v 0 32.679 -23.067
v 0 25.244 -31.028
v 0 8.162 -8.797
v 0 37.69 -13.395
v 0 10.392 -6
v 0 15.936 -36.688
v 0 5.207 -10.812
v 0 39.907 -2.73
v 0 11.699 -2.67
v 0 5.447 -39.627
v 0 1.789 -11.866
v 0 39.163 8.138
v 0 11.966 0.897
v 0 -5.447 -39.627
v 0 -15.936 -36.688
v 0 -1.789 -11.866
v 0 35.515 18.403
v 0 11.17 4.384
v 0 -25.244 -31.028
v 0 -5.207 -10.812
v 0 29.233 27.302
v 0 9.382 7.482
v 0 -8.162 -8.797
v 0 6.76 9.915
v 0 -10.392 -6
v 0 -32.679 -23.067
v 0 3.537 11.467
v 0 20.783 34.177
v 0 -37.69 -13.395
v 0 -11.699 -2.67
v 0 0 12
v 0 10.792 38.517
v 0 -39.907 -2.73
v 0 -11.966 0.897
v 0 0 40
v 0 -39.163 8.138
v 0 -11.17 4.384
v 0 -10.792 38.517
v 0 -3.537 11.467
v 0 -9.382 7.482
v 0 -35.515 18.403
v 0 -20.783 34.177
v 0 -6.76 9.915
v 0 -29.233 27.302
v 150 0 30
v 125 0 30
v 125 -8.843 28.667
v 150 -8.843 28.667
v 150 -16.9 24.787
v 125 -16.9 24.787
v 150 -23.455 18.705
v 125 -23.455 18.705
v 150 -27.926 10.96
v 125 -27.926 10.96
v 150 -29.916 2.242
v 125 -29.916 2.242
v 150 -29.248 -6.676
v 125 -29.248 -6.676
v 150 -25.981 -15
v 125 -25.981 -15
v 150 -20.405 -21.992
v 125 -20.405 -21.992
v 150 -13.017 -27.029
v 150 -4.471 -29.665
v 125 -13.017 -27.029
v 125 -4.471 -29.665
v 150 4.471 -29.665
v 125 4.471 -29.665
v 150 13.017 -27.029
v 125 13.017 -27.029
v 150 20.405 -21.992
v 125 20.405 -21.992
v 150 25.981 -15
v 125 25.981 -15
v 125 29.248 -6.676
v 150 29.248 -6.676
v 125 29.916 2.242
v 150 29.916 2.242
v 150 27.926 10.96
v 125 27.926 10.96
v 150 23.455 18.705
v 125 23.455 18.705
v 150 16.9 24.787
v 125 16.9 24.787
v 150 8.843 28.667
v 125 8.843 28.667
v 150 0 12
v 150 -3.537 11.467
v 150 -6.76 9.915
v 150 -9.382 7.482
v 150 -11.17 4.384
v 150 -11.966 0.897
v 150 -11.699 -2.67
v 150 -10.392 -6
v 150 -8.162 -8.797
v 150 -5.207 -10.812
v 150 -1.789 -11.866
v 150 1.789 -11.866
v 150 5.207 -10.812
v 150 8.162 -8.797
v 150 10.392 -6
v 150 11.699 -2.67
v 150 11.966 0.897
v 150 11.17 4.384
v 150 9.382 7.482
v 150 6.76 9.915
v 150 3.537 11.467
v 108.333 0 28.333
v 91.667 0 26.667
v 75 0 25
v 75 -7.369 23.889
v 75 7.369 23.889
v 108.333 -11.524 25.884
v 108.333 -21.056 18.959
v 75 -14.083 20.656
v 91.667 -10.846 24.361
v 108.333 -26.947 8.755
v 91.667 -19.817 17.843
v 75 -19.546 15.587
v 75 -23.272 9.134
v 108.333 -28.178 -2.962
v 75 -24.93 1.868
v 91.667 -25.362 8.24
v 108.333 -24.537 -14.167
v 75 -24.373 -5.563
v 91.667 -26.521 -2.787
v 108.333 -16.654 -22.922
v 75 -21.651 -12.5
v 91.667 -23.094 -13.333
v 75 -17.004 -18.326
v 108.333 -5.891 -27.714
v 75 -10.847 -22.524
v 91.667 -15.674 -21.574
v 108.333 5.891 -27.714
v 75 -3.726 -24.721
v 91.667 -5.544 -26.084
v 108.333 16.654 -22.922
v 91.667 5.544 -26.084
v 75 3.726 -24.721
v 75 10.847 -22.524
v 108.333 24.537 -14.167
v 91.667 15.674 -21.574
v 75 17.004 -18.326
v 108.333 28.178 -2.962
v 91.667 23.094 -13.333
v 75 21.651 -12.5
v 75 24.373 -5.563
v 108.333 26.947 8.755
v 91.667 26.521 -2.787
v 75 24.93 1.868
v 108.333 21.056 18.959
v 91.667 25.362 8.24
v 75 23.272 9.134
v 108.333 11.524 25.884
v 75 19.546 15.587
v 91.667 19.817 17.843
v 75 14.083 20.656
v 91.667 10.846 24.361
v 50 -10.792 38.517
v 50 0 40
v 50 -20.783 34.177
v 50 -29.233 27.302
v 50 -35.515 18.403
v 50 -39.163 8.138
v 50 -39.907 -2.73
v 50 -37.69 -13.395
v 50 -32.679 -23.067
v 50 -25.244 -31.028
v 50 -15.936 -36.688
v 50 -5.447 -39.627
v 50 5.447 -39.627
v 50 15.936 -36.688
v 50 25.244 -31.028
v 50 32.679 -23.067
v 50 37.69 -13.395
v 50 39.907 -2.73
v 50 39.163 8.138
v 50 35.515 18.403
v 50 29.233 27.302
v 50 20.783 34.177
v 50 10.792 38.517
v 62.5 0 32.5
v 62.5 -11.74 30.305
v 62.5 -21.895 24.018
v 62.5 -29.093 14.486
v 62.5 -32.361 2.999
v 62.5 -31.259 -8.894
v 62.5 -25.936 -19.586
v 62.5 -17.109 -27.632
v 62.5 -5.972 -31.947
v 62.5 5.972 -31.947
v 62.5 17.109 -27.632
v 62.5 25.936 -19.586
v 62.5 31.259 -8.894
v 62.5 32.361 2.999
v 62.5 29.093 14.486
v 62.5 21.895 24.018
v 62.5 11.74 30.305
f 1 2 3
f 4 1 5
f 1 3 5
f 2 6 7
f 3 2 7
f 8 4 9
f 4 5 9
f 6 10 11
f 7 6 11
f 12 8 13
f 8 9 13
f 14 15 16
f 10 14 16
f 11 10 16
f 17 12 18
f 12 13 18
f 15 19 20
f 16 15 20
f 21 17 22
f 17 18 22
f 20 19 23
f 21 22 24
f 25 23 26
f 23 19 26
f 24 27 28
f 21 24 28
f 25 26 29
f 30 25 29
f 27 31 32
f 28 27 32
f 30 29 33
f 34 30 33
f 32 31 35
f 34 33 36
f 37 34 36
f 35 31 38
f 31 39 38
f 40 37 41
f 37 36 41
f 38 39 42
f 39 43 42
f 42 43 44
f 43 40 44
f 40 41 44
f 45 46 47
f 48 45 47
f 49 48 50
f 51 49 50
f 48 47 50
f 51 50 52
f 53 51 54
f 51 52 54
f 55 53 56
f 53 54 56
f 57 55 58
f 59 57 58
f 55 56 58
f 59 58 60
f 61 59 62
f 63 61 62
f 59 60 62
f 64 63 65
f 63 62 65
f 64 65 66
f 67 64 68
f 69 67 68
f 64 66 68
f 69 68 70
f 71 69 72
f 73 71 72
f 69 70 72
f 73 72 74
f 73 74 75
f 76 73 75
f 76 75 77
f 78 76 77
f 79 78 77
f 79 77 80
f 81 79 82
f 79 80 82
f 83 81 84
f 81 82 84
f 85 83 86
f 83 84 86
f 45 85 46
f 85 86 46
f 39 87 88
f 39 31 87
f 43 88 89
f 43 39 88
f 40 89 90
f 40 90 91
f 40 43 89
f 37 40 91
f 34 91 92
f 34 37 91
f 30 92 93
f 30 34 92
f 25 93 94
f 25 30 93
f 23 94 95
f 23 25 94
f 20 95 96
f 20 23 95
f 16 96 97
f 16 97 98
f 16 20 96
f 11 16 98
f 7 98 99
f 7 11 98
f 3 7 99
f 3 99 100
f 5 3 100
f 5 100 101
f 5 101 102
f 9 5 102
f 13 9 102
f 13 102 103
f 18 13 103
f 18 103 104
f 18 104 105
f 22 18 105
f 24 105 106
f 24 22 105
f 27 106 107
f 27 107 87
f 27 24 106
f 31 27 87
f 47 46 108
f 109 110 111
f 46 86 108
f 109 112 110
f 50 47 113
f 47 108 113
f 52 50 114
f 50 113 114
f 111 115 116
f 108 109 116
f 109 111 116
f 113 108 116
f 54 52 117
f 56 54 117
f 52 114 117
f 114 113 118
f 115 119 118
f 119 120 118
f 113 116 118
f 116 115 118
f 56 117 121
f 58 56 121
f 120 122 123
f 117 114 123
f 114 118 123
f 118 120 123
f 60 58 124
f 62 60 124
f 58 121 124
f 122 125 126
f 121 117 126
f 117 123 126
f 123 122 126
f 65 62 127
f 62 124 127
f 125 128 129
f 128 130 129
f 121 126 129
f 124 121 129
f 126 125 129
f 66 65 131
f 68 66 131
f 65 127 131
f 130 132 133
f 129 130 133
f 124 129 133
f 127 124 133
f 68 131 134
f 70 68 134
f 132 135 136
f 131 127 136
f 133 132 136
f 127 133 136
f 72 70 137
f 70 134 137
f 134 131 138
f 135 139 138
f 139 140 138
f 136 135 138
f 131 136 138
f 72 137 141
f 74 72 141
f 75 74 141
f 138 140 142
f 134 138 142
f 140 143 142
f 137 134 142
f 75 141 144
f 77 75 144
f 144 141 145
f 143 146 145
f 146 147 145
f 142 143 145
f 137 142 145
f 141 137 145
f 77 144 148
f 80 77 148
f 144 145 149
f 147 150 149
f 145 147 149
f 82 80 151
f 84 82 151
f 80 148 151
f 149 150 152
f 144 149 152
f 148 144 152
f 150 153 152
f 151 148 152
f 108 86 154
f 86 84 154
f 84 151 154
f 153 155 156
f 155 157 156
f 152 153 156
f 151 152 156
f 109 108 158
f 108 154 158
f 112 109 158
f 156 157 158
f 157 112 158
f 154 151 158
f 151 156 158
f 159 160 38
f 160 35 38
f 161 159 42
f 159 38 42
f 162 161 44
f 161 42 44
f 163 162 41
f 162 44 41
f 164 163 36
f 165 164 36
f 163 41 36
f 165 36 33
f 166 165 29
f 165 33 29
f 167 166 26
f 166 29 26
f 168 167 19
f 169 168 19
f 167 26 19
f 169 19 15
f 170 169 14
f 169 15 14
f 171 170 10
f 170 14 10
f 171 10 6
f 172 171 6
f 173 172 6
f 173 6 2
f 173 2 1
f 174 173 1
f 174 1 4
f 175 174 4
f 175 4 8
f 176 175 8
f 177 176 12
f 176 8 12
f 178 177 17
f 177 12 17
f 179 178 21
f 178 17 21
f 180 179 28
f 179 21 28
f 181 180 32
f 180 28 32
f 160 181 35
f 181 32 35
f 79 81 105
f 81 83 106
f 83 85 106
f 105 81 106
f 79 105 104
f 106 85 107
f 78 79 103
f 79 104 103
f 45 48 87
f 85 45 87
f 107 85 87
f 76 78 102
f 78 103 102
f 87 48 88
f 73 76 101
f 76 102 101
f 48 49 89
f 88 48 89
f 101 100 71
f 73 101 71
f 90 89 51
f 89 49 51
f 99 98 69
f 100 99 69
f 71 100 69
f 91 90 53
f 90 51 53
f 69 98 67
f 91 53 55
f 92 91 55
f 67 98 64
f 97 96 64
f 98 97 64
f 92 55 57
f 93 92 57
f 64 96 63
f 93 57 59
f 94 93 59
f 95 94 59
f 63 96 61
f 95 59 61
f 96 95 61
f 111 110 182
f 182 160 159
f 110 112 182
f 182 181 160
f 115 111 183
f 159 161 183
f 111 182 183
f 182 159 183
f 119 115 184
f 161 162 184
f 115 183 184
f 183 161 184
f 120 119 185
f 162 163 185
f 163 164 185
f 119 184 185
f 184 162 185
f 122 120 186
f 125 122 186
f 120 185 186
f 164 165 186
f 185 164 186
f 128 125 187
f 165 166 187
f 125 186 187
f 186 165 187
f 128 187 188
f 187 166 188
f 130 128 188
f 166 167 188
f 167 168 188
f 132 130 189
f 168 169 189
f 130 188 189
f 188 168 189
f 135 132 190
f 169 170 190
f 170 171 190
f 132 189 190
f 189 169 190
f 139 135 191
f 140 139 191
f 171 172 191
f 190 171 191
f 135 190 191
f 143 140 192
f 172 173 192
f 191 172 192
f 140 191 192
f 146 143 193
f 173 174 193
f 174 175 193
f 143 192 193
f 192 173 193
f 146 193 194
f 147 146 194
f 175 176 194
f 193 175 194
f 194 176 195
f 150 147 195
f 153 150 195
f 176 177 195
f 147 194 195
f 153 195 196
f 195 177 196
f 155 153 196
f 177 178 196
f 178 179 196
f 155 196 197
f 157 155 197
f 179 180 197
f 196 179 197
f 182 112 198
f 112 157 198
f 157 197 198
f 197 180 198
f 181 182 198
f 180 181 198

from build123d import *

# Parameters (mm, degrees)
F2_DEPTH = 25


with BuildPart() as f1:
    # F0 (on Front) → F1 (revolve)
    with BuildSketch(Plane.XZ):
        Polygon((0, 40), (0, 12), (125, 12), (125, 30), (75, 25), (50, 40), align=None)
    revolve(axis=Axis((34.2099070549, 0, 0), (1, 0, 0)))

    # F2 (add): a face of the model
    f2_faces = [f1.faces().sort_by_distance(p)[0] for p in [
        (125, 0, -12.8485281374),
    ]]
    extrude(f2_faces, amount=F2_DEPTH)


solid = f1.part
